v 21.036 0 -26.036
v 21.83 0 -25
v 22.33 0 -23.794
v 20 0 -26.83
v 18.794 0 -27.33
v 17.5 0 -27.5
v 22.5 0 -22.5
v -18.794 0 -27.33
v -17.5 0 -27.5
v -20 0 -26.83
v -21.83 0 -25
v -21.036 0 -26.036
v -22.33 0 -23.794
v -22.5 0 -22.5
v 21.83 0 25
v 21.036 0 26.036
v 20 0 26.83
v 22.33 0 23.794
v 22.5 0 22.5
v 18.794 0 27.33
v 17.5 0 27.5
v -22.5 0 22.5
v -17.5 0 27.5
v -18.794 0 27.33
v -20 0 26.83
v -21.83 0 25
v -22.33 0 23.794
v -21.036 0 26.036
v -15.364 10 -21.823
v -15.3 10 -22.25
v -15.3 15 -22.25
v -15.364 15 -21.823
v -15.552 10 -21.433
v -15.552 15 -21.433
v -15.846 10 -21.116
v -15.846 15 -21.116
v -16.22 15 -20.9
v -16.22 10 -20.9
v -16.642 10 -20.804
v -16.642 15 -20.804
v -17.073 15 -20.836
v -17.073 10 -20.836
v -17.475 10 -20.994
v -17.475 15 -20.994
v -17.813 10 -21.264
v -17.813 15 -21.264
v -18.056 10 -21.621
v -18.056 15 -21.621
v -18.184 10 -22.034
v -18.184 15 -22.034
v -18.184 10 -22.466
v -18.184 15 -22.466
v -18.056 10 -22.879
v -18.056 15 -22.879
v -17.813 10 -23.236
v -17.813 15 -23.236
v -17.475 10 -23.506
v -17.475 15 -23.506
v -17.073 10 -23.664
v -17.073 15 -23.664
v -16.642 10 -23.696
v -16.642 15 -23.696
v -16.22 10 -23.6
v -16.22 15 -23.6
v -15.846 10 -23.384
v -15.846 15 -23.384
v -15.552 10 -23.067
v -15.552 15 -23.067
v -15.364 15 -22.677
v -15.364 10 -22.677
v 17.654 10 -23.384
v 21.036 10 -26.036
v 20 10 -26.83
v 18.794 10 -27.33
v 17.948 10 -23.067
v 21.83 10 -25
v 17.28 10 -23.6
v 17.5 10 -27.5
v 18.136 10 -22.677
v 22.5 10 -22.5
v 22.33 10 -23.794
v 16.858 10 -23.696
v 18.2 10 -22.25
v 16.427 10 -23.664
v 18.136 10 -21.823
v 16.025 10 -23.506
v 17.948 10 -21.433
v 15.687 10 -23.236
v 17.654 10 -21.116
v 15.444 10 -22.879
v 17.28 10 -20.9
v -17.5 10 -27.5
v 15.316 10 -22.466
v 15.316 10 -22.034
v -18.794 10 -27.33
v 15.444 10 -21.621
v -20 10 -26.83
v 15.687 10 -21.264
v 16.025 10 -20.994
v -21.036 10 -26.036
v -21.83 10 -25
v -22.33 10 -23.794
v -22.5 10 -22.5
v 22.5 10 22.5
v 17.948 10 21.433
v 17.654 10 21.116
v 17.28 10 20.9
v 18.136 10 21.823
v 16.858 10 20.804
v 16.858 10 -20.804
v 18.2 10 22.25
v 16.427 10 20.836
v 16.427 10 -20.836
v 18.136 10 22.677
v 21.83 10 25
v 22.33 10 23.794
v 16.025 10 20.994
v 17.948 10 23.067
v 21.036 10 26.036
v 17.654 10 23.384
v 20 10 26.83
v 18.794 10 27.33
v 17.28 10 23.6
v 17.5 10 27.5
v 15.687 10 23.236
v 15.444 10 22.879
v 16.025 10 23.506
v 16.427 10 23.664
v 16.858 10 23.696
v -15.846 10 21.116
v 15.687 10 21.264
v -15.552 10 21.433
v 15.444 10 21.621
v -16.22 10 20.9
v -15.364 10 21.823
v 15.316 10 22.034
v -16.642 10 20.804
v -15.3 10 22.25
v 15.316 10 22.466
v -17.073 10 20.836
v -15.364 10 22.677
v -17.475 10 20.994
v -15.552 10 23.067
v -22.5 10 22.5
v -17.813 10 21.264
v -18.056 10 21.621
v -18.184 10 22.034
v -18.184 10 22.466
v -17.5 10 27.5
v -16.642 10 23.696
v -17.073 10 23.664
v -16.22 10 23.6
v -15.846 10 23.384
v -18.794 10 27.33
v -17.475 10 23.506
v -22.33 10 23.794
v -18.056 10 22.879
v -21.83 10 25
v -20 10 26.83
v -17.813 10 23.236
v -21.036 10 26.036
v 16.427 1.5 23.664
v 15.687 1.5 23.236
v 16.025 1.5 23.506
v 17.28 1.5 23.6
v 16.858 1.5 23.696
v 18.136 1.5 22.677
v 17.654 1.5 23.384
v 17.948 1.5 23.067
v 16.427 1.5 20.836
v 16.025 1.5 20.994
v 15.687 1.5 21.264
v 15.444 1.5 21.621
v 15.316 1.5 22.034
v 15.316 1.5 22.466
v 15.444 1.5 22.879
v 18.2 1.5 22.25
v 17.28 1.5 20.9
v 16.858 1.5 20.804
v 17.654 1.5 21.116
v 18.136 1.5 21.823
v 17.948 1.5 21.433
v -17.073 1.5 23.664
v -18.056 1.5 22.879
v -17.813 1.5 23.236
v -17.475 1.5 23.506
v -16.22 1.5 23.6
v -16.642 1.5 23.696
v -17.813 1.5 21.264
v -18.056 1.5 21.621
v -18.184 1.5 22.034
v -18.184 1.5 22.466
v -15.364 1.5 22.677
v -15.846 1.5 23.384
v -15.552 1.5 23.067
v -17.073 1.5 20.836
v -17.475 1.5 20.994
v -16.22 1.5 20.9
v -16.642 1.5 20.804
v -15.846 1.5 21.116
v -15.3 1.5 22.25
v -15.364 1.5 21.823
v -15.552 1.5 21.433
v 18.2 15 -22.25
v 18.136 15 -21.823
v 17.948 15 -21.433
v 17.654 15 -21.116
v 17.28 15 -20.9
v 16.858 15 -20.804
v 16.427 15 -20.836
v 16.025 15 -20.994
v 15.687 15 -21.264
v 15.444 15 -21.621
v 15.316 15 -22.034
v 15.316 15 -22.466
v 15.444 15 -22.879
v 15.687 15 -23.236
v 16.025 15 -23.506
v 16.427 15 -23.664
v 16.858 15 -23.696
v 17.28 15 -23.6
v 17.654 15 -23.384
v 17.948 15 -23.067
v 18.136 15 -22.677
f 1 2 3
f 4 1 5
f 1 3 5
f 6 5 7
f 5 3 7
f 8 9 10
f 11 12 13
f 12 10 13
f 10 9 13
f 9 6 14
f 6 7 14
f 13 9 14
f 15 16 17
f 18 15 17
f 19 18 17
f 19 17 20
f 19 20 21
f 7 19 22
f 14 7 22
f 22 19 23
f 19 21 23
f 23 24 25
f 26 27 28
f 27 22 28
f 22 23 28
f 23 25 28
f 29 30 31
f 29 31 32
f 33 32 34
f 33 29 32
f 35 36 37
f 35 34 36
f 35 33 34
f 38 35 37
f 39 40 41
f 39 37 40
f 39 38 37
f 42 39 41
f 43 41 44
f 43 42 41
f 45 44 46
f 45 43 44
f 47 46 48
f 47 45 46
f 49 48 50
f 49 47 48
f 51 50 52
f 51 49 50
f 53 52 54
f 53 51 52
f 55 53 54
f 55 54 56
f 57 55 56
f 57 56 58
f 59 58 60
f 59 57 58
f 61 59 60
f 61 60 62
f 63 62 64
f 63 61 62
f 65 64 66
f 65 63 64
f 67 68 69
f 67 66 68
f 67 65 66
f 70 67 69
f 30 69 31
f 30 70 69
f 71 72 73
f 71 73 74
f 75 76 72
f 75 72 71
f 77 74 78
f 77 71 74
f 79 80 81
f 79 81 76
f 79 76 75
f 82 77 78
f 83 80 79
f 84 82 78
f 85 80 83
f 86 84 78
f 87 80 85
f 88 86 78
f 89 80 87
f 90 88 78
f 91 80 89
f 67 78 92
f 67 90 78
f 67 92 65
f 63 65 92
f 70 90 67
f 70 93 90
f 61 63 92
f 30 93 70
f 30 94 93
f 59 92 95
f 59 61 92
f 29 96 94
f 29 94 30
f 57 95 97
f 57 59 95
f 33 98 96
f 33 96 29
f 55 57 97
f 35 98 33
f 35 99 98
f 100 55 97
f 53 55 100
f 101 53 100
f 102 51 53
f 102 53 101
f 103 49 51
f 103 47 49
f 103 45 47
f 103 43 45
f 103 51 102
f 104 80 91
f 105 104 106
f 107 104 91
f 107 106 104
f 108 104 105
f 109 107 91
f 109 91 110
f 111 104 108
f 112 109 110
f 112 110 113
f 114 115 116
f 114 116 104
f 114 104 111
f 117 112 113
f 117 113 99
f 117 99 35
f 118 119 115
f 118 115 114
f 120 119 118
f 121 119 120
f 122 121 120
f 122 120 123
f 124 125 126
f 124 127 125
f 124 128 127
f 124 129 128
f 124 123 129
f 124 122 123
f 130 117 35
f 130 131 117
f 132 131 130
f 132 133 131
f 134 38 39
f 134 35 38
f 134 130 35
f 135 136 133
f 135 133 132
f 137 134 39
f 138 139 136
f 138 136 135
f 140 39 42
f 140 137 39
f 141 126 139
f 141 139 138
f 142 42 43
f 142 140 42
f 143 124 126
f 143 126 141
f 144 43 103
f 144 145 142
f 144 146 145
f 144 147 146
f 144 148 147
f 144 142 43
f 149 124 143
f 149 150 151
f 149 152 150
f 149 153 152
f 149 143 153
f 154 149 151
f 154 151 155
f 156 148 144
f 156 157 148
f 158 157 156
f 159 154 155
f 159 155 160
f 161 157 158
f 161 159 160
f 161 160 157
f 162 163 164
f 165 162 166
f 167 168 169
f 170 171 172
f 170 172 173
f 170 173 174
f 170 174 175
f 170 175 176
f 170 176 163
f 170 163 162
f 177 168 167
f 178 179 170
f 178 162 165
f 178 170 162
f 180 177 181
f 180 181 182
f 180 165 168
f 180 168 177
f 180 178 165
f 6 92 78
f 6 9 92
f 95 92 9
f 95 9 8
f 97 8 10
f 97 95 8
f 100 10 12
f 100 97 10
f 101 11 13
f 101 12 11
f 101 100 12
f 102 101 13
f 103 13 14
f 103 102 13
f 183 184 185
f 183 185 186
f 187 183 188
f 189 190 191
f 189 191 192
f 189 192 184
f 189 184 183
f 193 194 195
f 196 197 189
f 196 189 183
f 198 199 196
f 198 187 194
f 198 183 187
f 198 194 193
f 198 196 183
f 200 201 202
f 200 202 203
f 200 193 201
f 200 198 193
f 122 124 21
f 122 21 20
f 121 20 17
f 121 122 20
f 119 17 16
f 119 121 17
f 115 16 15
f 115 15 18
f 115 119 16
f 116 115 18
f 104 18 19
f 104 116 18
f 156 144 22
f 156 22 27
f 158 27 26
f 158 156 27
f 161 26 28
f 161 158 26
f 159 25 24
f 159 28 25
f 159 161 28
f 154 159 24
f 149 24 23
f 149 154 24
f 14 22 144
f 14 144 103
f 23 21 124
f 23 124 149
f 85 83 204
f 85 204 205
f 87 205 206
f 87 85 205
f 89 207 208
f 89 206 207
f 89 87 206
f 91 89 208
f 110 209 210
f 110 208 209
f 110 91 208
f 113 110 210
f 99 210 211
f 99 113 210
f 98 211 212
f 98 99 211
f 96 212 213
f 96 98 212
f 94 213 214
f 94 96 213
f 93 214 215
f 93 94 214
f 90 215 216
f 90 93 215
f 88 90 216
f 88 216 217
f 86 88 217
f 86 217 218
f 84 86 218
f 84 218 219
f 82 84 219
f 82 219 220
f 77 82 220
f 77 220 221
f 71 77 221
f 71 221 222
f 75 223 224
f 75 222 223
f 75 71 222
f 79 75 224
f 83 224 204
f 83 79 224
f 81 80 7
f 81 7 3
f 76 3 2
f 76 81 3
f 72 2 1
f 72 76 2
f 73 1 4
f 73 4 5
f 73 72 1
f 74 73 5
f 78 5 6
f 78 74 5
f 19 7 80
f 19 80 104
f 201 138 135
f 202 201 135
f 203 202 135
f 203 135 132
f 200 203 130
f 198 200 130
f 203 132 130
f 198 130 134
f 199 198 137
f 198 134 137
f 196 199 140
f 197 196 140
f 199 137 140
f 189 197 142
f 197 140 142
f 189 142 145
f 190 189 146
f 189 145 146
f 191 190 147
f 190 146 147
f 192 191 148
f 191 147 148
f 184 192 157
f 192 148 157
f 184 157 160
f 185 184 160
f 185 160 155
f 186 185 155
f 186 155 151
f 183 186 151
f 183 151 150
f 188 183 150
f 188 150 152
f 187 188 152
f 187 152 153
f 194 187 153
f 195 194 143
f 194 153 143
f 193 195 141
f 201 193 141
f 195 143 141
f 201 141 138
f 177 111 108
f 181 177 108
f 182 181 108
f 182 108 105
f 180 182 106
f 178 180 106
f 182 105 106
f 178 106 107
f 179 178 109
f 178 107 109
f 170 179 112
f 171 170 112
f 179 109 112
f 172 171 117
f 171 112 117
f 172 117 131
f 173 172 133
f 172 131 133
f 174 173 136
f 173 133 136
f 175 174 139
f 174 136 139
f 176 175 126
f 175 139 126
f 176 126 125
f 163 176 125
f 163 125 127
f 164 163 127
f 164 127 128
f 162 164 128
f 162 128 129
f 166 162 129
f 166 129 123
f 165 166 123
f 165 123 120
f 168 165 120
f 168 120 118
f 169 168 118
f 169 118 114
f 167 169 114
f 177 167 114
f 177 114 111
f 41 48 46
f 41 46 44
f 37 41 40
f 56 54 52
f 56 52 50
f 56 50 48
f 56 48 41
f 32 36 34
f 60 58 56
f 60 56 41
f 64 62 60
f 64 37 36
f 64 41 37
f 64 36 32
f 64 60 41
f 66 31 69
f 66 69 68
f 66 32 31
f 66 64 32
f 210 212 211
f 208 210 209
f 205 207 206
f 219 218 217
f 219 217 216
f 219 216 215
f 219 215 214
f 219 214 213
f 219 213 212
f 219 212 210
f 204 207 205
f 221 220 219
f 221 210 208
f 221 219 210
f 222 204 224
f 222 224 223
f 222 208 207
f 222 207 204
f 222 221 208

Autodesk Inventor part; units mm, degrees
ref_plane "YZ Plane" through (0, 0, 0) normal (1, 0, 0) x (0, 1, 0)
ref_plane "XZ Plane" through (0, 0, 0) normal (0, 1, 0) x (-1, 0, 0)
ref_plane "XY Plane" through (0, 0, 0) normal (0, 0, 1) x (1, 0, 0)
sketch "Esboço1" plane through (0, 0, 0) normal (0, 1, 0) x (-1, 0, 0)
  line L0 (-22.5, 27.5) -> (22.5, 27.5)
  line L1 (22.5, 27.5) -> (22.5, -27.5)
  line L2 (22.5, -27.5) -> (-22.5, -27.5)
  line L3 (-22.5, -27.5) -> (-22.5, 27.5)
  line L4 (-22.5, 27.5) -> (22.5, -27.5) construction
  line L5 (22.5, 27.5) -> (-22.5, -27.5) construction
  circle A0 centre (16.75, -22.25) radius 1.45
  circle A1 centre (16.75, 22.25) radius 1.45
  circle A2 centre (-16.75, 22.25) radius 1.45
  circle A3 centre (-16.75, -22.25) radius 1.45
  line L6 (-16.75, 22.25) -> (-16.75, -22.25) construction
  line L7 (-16.75, -22.25) -> (16.75, -22.25) construction
  line L8 (16.75, -22.25) -> (16.75, 22.25) construction
  line L9 (16.75, 22.25) -> (-16.75, 22.25) construction
  line L10 (0, 0) -> (9.1939, 0)
  line L11 (0, 0) -> (0, -6.5379)
  line L12 (16.75, 0) -> (30.08, 0) construction
  line L13 (0, 22.25) -> (0, 28.3312) construction
  dimension "d0" = 2.9
  dimension "d1" = 2.9
  dimension "d2" = 2.9
  dimension "d3" = 2.9
  dimension "d4" = 33.5
  dimension "d5" = 44.5
  dimension "d6" = 55
  dimension "d7" = 45
extrude "Extrusão1" add sketch "Esboço1" along normal blind 10 contours L0 L1 L2 L3 | A0 | A1 | A2 | A3
sketch "Esboço2" plane through (0, 10, 0) normal (0, 1, 0) x (1, 0, 0)
  circle A0 centre (16.75, -22.25) radius 1.45 projected
  circle A1 centre (-16.75, -22.25) radius 1.45 projected
  circle A2 centre (16.75, 22.25) radius 1.45 projected
  circle A3 centre (-16.75, 22.25) radius 1.45 projected
  point P0 (0, 0)
extrude "Extrusão2" cut sketch "Esboço2" against normal blind 8.5 contours A0 | A1
extrude "Extrusão3" add sketch "Esboço2" along normal blind 5 contours A2 | A3
fillet "Arredondamento1" radius 5 4 edges at (22.5, 5, 27.5) (22.5, 5, -27.5) (-22.5, 5, -27.5) (-22.5, 5, 27.5)
properties part number "BASE RELE"
